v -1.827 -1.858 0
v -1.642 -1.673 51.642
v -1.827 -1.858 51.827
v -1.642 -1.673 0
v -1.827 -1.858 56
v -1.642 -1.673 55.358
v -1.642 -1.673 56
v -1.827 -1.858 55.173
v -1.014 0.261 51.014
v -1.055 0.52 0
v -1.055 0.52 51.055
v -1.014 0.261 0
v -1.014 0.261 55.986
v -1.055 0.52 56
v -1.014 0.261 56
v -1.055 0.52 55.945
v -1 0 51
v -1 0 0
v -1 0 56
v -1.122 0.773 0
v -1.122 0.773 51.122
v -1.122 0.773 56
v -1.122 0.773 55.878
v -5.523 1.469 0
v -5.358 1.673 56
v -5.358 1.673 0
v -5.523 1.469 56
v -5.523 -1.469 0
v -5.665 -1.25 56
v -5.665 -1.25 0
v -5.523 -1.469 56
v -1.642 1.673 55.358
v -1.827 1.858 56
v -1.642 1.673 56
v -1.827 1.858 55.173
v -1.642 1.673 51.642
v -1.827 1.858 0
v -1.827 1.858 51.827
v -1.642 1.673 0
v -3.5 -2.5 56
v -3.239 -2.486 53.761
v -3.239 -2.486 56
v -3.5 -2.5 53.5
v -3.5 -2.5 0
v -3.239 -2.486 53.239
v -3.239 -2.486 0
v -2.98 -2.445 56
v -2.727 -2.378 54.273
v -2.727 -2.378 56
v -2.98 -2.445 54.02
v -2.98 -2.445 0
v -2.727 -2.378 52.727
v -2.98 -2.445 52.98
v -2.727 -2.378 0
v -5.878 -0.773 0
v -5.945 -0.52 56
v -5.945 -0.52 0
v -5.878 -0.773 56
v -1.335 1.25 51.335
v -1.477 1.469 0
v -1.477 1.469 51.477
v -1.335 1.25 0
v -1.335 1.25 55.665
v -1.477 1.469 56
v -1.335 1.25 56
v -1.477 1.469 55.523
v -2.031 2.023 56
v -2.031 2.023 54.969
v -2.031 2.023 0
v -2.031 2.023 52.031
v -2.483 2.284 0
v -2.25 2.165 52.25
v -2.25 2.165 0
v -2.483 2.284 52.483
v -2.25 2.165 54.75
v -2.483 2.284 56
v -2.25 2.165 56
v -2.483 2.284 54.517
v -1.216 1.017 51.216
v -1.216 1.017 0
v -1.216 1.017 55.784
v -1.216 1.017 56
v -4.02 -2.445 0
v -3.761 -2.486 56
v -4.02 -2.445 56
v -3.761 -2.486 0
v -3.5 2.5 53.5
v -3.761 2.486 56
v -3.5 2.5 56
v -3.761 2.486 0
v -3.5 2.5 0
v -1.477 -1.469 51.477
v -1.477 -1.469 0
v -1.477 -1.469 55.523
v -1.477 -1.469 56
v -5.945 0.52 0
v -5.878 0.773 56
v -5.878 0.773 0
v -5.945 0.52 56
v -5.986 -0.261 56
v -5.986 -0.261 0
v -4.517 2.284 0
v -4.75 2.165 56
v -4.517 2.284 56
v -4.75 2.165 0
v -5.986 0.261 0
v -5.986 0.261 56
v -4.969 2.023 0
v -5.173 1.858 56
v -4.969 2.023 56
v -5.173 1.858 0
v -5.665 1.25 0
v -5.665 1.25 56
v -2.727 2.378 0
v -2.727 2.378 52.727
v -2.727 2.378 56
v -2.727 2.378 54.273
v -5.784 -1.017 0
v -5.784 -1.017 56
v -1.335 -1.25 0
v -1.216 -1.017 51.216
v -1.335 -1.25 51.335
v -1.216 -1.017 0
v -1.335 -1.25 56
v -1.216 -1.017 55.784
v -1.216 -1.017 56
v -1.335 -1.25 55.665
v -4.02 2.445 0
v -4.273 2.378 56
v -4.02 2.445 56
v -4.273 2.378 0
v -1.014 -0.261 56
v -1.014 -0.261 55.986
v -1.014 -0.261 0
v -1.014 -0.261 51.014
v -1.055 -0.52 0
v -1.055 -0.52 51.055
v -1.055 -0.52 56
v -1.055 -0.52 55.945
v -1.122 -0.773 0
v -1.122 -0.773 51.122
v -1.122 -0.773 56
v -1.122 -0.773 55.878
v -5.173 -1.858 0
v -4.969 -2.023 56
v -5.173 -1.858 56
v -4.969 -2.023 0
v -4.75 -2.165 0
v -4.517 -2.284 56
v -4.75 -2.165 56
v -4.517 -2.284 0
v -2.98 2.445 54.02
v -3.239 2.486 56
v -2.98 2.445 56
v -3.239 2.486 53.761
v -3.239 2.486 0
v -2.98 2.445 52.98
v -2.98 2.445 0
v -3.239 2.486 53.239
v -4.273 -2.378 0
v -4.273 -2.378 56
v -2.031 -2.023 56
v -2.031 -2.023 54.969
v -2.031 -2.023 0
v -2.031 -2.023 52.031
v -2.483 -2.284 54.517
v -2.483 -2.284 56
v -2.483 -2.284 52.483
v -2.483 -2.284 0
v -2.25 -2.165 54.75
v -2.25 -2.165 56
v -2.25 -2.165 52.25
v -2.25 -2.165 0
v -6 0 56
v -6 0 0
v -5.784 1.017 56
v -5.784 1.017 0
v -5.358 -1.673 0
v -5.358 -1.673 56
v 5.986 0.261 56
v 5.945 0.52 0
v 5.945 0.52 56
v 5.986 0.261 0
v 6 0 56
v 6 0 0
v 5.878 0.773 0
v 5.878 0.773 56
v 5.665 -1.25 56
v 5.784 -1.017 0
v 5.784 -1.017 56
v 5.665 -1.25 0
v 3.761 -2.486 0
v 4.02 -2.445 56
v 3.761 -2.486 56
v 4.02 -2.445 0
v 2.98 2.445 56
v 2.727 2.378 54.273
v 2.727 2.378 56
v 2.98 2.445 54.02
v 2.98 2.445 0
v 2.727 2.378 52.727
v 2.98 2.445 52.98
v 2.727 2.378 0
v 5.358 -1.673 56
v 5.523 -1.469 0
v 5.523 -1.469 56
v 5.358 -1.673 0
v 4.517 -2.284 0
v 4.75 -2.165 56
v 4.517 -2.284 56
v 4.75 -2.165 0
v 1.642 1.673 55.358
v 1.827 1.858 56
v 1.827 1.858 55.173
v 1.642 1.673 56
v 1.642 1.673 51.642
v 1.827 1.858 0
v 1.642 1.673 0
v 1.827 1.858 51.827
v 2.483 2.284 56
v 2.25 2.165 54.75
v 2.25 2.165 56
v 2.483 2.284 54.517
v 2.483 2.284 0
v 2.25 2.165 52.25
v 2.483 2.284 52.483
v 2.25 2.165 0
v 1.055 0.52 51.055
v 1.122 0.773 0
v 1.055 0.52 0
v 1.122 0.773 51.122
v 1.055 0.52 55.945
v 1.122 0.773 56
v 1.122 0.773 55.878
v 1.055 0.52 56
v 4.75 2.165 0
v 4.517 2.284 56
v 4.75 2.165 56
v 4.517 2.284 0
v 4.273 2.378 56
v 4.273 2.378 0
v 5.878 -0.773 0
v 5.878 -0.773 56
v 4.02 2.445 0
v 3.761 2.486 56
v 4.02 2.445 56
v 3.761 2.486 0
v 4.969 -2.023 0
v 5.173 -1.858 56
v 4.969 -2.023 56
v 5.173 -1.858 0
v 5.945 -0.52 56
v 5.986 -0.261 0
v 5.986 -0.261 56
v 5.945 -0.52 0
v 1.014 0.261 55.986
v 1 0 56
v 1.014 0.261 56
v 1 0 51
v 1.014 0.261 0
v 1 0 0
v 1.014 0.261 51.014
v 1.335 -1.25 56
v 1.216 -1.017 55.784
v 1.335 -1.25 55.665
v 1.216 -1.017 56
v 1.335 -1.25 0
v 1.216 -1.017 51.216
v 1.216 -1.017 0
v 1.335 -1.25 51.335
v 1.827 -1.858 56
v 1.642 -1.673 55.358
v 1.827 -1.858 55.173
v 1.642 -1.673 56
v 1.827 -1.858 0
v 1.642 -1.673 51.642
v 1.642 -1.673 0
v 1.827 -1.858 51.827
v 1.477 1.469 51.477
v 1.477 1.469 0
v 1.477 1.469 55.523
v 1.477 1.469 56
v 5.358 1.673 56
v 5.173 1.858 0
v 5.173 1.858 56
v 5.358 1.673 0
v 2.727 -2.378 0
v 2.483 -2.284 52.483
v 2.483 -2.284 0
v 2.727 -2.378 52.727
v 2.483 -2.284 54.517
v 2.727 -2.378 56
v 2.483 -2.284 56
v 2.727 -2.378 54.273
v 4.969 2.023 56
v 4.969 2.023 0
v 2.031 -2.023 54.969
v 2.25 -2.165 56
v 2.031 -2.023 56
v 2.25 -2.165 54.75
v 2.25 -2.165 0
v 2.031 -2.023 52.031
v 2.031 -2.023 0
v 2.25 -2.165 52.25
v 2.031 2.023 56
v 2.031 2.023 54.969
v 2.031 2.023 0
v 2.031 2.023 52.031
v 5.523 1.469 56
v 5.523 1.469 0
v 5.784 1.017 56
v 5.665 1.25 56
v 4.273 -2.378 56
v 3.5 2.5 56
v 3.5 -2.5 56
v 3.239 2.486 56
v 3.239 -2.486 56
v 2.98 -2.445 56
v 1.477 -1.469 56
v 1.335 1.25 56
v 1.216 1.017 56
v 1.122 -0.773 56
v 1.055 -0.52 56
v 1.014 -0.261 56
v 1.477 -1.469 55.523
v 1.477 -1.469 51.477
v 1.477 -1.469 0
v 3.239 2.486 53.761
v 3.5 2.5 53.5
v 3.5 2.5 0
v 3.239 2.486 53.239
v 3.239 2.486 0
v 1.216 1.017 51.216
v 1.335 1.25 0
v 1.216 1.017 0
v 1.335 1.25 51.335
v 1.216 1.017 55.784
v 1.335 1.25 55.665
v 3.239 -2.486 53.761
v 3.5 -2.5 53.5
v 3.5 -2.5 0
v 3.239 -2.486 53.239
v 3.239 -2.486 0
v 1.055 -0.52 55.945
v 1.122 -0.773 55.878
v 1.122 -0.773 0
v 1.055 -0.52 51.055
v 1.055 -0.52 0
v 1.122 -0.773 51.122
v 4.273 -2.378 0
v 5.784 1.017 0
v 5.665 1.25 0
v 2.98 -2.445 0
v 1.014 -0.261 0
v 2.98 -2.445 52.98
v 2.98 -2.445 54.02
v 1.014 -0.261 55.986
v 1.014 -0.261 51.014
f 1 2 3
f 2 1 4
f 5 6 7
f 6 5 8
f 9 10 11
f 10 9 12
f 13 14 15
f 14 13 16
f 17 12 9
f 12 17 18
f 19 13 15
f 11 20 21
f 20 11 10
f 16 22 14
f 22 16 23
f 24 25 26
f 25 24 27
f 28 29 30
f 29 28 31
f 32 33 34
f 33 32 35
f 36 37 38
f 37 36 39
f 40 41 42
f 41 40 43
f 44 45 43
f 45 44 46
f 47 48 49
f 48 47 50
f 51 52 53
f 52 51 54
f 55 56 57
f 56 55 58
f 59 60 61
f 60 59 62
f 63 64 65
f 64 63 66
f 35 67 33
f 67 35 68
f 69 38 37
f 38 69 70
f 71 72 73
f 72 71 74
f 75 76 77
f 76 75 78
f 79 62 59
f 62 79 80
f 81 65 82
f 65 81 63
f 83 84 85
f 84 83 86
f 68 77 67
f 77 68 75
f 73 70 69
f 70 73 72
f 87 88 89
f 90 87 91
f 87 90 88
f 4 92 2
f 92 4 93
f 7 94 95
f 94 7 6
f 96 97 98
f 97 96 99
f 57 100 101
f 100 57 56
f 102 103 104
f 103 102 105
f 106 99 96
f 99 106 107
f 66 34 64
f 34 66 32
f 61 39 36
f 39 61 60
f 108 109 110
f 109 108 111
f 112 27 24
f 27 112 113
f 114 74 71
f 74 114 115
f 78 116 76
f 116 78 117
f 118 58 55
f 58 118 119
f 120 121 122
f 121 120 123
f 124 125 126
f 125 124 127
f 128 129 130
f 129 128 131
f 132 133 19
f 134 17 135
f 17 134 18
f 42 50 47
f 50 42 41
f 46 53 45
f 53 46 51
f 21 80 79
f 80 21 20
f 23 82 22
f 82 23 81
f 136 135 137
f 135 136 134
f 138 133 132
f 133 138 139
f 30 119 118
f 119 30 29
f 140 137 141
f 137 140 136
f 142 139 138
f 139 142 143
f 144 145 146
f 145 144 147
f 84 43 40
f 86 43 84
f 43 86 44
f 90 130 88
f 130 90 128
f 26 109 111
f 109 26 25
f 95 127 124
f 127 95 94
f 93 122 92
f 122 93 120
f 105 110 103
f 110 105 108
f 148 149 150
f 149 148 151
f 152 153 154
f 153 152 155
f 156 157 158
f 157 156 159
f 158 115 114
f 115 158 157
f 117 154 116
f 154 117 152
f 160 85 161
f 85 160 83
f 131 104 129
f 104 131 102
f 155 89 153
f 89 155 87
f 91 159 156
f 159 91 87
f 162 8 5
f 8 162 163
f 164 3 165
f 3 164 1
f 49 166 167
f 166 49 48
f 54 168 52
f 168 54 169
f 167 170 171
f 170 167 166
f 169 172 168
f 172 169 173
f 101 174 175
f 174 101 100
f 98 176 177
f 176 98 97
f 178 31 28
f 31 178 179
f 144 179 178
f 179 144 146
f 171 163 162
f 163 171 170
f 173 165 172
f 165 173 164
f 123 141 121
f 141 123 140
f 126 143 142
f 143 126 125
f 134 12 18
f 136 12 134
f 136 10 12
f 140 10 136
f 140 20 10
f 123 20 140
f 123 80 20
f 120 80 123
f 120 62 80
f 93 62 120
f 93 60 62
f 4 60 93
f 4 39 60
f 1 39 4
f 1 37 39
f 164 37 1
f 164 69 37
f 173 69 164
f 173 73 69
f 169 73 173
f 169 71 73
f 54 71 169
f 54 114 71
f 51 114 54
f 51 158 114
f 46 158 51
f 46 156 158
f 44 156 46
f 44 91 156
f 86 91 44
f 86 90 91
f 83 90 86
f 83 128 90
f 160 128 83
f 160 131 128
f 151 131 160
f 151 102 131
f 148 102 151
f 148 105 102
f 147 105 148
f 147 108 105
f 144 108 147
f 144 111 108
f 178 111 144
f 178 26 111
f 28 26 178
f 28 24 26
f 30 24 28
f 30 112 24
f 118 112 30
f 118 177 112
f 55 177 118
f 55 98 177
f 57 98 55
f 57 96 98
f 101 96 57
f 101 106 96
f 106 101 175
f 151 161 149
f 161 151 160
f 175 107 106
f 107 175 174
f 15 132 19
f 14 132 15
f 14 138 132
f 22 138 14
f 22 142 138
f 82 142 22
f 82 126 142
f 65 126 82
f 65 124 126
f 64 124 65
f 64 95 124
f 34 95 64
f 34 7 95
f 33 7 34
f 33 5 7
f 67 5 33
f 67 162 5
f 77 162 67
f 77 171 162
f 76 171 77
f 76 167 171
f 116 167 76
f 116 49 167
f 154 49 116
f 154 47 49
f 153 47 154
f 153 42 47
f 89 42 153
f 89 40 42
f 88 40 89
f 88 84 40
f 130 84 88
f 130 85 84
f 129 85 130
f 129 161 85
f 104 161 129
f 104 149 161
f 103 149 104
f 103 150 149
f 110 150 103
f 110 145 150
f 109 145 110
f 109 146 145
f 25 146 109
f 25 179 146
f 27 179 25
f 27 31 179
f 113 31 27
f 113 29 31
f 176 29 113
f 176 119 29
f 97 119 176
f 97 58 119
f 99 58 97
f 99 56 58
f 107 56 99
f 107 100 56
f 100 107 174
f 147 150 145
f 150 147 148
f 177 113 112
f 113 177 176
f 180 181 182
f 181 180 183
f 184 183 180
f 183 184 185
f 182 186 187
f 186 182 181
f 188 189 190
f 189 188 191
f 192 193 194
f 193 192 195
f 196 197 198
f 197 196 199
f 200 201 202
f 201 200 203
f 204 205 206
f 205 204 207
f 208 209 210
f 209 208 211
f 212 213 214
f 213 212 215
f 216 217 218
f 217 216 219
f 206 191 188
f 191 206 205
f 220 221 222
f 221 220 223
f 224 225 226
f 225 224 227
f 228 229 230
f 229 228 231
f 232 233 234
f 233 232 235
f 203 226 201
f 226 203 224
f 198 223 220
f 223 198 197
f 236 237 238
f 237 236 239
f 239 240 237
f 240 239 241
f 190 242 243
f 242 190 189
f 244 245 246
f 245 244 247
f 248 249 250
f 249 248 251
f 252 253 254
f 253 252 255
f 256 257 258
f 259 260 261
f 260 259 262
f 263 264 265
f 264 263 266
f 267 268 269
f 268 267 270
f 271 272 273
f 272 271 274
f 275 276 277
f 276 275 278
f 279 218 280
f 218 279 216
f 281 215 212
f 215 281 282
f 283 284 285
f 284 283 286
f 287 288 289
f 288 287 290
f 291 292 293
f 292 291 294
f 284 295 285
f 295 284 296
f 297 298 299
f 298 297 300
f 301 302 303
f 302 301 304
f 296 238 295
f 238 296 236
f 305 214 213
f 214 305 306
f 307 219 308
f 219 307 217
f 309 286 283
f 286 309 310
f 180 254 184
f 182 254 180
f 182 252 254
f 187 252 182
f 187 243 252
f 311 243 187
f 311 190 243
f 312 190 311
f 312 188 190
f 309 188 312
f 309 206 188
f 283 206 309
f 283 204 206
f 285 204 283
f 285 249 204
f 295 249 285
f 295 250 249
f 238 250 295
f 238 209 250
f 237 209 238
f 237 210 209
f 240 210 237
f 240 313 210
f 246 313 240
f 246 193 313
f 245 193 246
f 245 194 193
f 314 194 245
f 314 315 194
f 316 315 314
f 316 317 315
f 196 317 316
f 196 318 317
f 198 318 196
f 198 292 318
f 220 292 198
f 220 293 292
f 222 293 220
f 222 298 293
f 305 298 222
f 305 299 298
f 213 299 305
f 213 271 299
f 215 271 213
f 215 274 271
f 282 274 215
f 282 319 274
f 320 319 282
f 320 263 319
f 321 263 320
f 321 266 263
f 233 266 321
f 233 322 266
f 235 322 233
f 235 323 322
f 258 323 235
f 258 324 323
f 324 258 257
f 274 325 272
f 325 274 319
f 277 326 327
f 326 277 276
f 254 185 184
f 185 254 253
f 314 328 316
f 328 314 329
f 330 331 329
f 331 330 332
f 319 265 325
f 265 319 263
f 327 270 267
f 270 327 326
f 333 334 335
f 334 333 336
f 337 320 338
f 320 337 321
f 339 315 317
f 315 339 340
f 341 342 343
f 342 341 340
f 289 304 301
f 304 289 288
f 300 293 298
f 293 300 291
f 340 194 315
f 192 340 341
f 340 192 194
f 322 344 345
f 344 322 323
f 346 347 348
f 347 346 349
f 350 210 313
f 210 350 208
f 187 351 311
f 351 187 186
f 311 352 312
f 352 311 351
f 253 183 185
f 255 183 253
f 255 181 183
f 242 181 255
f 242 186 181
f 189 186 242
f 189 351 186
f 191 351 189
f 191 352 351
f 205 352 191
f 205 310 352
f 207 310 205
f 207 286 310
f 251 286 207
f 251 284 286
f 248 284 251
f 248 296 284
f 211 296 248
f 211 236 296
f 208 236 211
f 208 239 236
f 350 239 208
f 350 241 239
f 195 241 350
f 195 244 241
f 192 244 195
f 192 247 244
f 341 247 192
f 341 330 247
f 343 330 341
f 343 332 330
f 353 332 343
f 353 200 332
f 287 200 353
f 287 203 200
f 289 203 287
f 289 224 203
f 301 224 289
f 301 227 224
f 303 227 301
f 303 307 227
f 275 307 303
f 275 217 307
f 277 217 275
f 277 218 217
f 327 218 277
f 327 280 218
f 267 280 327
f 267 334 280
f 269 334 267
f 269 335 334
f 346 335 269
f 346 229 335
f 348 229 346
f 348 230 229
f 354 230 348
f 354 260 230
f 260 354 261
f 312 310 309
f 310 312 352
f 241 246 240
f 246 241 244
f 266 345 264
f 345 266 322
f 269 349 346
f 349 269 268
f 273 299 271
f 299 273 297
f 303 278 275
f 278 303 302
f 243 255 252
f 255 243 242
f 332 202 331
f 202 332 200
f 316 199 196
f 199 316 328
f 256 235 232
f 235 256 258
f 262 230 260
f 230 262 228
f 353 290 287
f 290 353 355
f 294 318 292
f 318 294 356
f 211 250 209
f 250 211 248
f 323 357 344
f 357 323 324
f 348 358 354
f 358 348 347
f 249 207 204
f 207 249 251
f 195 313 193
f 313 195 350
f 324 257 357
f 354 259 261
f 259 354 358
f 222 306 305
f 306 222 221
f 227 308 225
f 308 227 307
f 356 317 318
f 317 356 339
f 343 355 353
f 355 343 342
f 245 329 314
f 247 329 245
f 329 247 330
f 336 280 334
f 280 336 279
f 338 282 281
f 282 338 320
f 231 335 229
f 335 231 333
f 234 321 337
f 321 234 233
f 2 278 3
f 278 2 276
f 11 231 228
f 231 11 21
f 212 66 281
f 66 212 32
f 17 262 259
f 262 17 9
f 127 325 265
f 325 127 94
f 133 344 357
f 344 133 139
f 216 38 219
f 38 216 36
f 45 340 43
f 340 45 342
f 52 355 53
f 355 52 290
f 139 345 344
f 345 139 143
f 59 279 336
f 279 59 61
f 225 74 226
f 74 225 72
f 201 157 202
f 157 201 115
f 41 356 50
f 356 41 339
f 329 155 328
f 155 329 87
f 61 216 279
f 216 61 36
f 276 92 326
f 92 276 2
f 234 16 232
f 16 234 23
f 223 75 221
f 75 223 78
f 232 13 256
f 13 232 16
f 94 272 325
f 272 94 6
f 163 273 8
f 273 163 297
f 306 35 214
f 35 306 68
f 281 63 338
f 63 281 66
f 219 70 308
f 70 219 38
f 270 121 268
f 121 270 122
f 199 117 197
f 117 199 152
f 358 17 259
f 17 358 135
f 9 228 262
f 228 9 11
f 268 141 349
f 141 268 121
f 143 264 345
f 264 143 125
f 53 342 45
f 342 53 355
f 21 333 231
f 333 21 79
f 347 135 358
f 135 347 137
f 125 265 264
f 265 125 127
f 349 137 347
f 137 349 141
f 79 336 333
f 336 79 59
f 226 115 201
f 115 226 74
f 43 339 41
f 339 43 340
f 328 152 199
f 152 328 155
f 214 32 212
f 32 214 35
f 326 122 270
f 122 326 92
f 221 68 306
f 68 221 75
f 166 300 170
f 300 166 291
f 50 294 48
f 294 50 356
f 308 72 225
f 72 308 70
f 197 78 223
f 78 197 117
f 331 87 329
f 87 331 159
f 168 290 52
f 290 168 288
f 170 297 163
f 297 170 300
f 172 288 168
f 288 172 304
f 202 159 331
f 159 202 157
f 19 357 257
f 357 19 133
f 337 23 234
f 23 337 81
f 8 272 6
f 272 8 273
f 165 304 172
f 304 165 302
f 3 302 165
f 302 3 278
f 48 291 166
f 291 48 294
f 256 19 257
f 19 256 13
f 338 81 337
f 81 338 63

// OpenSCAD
// Two-prong cotter pin.
$fn = 60;
eps = 0.02;
wire_d = 5;
length = 56;
prong_gap = wire_d*1.4;
union() {
    translate([-prong_gap/2,0,0]) cylinder(d=wire_d,h=length);
    translate([prong_gap/2,0,0]) cylinder(d=wire_d,h=length);
    translate([-prong_gap/2,0,length-wire_d/2]) rotate([0,90,0]) cylinder(d=wire_d,h=prong_gap);
}
